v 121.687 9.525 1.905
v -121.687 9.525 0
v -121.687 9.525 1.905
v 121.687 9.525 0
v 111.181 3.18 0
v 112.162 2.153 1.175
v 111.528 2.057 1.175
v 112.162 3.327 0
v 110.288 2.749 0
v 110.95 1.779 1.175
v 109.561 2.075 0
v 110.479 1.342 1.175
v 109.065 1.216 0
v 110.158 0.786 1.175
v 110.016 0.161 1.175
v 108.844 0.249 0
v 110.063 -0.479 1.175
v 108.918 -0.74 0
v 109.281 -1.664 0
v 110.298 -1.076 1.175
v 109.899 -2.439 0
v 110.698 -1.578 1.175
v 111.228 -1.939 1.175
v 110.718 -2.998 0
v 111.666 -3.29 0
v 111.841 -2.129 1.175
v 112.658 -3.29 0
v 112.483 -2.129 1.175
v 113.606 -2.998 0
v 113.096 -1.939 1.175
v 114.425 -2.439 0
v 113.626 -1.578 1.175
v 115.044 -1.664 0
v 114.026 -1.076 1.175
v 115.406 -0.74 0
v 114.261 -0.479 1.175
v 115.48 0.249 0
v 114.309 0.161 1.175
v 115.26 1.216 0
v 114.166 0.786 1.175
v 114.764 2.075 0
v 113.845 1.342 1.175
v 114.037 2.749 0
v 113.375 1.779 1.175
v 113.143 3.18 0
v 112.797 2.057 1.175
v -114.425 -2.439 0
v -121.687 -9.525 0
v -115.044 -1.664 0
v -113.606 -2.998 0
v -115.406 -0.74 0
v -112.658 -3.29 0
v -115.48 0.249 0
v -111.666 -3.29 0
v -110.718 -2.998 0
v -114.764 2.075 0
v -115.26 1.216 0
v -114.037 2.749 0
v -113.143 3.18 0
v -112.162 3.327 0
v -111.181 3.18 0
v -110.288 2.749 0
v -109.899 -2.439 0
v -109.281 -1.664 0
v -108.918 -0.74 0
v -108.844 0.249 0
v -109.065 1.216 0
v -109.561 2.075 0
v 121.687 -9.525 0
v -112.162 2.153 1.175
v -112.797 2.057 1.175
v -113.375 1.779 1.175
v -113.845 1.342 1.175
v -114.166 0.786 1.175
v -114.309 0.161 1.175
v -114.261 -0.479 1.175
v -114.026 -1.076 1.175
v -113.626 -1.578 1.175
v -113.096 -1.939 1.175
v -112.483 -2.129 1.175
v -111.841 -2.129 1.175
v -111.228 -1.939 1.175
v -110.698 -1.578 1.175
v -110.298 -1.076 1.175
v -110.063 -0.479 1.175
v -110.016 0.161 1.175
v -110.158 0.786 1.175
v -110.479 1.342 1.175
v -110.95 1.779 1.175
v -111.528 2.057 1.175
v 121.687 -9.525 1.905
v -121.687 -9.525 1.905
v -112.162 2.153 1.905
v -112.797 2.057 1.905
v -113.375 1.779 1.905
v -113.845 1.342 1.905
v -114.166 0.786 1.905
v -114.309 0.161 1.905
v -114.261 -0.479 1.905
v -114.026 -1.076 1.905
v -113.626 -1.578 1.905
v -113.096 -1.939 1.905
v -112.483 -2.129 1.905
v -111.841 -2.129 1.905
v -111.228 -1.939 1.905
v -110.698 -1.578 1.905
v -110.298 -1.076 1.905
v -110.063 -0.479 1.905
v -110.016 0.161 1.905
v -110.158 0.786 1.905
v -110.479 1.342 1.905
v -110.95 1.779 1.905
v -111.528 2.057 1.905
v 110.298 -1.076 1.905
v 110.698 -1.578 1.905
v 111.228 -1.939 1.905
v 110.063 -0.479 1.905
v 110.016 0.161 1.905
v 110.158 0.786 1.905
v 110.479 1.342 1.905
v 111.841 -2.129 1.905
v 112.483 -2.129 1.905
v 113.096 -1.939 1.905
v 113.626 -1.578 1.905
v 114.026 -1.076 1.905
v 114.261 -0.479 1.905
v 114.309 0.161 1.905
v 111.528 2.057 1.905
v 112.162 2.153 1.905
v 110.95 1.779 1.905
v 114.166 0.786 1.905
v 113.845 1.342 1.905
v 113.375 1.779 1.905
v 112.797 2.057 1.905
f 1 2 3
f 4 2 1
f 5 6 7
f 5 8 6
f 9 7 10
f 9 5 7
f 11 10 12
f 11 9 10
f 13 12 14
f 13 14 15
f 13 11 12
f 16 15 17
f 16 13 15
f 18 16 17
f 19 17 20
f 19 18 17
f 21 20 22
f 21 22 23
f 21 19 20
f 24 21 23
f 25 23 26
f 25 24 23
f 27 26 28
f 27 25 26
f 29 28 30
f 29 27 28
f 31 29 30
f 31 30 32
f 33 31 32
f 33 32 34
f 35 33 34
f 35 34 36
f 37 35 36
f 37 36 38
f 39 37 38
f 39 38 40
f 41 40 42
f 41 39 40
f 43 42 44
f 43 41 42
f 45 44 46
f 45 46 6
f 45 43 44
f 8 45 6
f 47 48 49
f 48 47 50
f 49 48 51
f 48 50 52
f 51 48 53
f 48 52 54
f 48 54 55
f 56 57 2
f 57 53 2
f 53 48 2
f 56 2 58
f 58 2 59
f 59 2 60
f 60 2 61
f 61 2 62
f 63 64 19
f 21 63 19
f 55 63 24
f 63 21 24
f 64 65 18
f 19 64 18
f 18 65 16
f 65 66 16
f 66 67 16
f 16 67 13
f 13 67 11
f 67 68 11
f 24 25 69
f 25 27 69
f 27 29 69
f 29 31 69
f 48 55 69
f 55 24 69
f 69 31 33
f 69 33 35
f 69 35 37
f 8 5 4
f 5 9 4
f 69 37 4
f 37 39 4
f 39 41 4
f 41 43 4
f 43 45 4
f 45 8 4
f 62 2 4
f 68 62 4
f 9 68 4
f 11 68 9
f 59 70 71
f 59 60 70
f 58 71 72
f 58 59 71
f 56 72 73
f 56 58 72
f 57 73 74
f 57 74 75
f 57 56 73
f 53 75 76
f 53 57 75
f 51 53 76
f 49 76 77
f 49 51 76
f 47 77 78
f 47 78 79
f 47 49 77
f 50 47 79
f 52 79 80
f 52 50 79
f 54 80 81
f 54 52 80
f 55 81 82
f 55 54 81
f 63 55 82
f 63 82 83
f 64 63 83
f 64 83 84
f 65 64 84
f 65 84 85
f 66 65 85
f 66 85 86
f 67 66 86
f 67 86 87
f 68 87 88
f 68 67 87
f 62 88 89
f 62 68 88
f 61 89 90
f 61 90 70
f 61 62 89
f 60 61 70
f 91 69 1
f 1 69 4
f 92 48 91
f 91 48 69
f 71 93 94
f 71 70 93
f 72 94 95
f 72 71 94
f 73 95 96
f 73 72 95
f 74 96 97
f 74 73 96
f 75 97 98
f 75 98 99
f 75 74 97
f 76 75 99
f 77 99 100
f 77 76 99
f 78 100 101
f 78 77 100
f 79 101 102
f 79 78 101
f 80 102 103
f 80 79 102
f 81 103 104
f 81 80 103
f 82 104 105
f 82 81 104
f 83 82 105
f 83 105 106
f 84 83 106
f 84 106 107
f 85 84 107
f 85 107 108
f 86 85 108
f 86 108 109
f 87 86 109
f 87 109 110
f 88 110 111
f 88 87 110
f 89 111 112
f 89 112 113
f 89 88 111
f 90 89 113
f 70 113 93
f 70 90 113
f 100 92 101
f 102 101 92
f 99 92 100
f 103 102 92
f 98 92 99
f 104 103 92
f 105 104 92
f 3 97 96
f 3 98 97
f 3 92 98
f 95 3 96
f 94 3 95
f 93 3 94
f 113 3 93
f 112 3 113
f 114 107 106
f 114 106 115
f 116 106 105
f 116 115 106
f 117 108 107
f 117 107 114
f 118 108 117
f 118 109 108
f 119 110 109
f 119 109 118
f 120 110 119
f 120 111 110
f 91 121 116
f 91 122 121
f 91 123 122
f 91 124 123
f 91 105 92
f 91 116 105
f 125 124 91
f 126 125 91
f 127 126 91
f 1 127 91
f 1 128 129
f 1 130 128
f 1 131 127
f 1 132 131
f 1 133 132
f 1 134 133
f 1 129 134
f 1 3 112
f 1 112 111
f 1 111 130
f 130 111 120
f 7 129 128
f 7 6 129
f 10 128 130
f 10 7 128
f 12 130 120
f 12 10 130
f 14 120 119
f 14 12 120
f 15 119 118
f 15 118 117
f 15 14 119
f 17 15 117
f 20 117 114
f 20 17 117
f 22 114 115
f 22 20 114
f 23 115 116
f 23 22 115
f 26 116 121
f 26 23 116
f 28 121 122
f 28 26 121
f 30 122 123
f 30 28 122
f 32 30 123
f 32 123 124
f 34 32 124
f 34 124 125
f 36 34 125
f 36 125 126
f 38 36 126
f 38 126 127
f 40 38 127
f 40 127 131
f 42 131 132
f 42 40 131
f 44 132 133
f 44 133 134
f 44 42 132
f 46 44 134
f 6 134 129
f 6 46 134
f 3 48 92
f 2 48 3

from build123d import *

# Parameters (mm, degrees)
SKETCH3_W                      = 243.3743418
SKETCH3_H                      = 19.05
BOSS_EXTRUDE1_DEPTH            = 1.905
F_6_CLEARANCE_HOLE1_AT_2_COUNT = 2
F_6_CLEARANCE_HOLE1_AT_2_PITCH = 224.3243418


with BuildPart() as part:
    # Sketch3 → Boss-Extrude1 (new body)
    with BuildSketch(Plane.XY):
        Rectangle(SKETCH3_W, SKETCH3_H)
    extrude(amount=BOSS_EXTRUDE1_DEPTH)

    # Sketch5 → #6 Clearance Hole1 (revolve, cut)
    with BuildSketch(Plane.YZ.offset(-112.1621709)):
        Polygon((0, 0), (0, 1.905), (2.15265, 1.905), (2.15265, 1.17475), (3.3274, 0), align=None)
    f_6_clearance_hole1 = revolve(axis=Axis((-112.1621709, 0, -6.35), (0, 0, 1)), mode=Mode.SUBTRACT)

    # #6 Clearance Hole1 at 2: #6 Clearance Hole1 ×2
    with Locations(*[(i * F_6_CLEARANCE_HOLE1_AT_2_PITCH, 0, 0) for i in range(1, F_6_CLEARANCE_HOLE1_AT_2_COUNT)]):
        add(f_6_clearance_hole1, mode=Mode.SUBTRACT)


solid = part.part
